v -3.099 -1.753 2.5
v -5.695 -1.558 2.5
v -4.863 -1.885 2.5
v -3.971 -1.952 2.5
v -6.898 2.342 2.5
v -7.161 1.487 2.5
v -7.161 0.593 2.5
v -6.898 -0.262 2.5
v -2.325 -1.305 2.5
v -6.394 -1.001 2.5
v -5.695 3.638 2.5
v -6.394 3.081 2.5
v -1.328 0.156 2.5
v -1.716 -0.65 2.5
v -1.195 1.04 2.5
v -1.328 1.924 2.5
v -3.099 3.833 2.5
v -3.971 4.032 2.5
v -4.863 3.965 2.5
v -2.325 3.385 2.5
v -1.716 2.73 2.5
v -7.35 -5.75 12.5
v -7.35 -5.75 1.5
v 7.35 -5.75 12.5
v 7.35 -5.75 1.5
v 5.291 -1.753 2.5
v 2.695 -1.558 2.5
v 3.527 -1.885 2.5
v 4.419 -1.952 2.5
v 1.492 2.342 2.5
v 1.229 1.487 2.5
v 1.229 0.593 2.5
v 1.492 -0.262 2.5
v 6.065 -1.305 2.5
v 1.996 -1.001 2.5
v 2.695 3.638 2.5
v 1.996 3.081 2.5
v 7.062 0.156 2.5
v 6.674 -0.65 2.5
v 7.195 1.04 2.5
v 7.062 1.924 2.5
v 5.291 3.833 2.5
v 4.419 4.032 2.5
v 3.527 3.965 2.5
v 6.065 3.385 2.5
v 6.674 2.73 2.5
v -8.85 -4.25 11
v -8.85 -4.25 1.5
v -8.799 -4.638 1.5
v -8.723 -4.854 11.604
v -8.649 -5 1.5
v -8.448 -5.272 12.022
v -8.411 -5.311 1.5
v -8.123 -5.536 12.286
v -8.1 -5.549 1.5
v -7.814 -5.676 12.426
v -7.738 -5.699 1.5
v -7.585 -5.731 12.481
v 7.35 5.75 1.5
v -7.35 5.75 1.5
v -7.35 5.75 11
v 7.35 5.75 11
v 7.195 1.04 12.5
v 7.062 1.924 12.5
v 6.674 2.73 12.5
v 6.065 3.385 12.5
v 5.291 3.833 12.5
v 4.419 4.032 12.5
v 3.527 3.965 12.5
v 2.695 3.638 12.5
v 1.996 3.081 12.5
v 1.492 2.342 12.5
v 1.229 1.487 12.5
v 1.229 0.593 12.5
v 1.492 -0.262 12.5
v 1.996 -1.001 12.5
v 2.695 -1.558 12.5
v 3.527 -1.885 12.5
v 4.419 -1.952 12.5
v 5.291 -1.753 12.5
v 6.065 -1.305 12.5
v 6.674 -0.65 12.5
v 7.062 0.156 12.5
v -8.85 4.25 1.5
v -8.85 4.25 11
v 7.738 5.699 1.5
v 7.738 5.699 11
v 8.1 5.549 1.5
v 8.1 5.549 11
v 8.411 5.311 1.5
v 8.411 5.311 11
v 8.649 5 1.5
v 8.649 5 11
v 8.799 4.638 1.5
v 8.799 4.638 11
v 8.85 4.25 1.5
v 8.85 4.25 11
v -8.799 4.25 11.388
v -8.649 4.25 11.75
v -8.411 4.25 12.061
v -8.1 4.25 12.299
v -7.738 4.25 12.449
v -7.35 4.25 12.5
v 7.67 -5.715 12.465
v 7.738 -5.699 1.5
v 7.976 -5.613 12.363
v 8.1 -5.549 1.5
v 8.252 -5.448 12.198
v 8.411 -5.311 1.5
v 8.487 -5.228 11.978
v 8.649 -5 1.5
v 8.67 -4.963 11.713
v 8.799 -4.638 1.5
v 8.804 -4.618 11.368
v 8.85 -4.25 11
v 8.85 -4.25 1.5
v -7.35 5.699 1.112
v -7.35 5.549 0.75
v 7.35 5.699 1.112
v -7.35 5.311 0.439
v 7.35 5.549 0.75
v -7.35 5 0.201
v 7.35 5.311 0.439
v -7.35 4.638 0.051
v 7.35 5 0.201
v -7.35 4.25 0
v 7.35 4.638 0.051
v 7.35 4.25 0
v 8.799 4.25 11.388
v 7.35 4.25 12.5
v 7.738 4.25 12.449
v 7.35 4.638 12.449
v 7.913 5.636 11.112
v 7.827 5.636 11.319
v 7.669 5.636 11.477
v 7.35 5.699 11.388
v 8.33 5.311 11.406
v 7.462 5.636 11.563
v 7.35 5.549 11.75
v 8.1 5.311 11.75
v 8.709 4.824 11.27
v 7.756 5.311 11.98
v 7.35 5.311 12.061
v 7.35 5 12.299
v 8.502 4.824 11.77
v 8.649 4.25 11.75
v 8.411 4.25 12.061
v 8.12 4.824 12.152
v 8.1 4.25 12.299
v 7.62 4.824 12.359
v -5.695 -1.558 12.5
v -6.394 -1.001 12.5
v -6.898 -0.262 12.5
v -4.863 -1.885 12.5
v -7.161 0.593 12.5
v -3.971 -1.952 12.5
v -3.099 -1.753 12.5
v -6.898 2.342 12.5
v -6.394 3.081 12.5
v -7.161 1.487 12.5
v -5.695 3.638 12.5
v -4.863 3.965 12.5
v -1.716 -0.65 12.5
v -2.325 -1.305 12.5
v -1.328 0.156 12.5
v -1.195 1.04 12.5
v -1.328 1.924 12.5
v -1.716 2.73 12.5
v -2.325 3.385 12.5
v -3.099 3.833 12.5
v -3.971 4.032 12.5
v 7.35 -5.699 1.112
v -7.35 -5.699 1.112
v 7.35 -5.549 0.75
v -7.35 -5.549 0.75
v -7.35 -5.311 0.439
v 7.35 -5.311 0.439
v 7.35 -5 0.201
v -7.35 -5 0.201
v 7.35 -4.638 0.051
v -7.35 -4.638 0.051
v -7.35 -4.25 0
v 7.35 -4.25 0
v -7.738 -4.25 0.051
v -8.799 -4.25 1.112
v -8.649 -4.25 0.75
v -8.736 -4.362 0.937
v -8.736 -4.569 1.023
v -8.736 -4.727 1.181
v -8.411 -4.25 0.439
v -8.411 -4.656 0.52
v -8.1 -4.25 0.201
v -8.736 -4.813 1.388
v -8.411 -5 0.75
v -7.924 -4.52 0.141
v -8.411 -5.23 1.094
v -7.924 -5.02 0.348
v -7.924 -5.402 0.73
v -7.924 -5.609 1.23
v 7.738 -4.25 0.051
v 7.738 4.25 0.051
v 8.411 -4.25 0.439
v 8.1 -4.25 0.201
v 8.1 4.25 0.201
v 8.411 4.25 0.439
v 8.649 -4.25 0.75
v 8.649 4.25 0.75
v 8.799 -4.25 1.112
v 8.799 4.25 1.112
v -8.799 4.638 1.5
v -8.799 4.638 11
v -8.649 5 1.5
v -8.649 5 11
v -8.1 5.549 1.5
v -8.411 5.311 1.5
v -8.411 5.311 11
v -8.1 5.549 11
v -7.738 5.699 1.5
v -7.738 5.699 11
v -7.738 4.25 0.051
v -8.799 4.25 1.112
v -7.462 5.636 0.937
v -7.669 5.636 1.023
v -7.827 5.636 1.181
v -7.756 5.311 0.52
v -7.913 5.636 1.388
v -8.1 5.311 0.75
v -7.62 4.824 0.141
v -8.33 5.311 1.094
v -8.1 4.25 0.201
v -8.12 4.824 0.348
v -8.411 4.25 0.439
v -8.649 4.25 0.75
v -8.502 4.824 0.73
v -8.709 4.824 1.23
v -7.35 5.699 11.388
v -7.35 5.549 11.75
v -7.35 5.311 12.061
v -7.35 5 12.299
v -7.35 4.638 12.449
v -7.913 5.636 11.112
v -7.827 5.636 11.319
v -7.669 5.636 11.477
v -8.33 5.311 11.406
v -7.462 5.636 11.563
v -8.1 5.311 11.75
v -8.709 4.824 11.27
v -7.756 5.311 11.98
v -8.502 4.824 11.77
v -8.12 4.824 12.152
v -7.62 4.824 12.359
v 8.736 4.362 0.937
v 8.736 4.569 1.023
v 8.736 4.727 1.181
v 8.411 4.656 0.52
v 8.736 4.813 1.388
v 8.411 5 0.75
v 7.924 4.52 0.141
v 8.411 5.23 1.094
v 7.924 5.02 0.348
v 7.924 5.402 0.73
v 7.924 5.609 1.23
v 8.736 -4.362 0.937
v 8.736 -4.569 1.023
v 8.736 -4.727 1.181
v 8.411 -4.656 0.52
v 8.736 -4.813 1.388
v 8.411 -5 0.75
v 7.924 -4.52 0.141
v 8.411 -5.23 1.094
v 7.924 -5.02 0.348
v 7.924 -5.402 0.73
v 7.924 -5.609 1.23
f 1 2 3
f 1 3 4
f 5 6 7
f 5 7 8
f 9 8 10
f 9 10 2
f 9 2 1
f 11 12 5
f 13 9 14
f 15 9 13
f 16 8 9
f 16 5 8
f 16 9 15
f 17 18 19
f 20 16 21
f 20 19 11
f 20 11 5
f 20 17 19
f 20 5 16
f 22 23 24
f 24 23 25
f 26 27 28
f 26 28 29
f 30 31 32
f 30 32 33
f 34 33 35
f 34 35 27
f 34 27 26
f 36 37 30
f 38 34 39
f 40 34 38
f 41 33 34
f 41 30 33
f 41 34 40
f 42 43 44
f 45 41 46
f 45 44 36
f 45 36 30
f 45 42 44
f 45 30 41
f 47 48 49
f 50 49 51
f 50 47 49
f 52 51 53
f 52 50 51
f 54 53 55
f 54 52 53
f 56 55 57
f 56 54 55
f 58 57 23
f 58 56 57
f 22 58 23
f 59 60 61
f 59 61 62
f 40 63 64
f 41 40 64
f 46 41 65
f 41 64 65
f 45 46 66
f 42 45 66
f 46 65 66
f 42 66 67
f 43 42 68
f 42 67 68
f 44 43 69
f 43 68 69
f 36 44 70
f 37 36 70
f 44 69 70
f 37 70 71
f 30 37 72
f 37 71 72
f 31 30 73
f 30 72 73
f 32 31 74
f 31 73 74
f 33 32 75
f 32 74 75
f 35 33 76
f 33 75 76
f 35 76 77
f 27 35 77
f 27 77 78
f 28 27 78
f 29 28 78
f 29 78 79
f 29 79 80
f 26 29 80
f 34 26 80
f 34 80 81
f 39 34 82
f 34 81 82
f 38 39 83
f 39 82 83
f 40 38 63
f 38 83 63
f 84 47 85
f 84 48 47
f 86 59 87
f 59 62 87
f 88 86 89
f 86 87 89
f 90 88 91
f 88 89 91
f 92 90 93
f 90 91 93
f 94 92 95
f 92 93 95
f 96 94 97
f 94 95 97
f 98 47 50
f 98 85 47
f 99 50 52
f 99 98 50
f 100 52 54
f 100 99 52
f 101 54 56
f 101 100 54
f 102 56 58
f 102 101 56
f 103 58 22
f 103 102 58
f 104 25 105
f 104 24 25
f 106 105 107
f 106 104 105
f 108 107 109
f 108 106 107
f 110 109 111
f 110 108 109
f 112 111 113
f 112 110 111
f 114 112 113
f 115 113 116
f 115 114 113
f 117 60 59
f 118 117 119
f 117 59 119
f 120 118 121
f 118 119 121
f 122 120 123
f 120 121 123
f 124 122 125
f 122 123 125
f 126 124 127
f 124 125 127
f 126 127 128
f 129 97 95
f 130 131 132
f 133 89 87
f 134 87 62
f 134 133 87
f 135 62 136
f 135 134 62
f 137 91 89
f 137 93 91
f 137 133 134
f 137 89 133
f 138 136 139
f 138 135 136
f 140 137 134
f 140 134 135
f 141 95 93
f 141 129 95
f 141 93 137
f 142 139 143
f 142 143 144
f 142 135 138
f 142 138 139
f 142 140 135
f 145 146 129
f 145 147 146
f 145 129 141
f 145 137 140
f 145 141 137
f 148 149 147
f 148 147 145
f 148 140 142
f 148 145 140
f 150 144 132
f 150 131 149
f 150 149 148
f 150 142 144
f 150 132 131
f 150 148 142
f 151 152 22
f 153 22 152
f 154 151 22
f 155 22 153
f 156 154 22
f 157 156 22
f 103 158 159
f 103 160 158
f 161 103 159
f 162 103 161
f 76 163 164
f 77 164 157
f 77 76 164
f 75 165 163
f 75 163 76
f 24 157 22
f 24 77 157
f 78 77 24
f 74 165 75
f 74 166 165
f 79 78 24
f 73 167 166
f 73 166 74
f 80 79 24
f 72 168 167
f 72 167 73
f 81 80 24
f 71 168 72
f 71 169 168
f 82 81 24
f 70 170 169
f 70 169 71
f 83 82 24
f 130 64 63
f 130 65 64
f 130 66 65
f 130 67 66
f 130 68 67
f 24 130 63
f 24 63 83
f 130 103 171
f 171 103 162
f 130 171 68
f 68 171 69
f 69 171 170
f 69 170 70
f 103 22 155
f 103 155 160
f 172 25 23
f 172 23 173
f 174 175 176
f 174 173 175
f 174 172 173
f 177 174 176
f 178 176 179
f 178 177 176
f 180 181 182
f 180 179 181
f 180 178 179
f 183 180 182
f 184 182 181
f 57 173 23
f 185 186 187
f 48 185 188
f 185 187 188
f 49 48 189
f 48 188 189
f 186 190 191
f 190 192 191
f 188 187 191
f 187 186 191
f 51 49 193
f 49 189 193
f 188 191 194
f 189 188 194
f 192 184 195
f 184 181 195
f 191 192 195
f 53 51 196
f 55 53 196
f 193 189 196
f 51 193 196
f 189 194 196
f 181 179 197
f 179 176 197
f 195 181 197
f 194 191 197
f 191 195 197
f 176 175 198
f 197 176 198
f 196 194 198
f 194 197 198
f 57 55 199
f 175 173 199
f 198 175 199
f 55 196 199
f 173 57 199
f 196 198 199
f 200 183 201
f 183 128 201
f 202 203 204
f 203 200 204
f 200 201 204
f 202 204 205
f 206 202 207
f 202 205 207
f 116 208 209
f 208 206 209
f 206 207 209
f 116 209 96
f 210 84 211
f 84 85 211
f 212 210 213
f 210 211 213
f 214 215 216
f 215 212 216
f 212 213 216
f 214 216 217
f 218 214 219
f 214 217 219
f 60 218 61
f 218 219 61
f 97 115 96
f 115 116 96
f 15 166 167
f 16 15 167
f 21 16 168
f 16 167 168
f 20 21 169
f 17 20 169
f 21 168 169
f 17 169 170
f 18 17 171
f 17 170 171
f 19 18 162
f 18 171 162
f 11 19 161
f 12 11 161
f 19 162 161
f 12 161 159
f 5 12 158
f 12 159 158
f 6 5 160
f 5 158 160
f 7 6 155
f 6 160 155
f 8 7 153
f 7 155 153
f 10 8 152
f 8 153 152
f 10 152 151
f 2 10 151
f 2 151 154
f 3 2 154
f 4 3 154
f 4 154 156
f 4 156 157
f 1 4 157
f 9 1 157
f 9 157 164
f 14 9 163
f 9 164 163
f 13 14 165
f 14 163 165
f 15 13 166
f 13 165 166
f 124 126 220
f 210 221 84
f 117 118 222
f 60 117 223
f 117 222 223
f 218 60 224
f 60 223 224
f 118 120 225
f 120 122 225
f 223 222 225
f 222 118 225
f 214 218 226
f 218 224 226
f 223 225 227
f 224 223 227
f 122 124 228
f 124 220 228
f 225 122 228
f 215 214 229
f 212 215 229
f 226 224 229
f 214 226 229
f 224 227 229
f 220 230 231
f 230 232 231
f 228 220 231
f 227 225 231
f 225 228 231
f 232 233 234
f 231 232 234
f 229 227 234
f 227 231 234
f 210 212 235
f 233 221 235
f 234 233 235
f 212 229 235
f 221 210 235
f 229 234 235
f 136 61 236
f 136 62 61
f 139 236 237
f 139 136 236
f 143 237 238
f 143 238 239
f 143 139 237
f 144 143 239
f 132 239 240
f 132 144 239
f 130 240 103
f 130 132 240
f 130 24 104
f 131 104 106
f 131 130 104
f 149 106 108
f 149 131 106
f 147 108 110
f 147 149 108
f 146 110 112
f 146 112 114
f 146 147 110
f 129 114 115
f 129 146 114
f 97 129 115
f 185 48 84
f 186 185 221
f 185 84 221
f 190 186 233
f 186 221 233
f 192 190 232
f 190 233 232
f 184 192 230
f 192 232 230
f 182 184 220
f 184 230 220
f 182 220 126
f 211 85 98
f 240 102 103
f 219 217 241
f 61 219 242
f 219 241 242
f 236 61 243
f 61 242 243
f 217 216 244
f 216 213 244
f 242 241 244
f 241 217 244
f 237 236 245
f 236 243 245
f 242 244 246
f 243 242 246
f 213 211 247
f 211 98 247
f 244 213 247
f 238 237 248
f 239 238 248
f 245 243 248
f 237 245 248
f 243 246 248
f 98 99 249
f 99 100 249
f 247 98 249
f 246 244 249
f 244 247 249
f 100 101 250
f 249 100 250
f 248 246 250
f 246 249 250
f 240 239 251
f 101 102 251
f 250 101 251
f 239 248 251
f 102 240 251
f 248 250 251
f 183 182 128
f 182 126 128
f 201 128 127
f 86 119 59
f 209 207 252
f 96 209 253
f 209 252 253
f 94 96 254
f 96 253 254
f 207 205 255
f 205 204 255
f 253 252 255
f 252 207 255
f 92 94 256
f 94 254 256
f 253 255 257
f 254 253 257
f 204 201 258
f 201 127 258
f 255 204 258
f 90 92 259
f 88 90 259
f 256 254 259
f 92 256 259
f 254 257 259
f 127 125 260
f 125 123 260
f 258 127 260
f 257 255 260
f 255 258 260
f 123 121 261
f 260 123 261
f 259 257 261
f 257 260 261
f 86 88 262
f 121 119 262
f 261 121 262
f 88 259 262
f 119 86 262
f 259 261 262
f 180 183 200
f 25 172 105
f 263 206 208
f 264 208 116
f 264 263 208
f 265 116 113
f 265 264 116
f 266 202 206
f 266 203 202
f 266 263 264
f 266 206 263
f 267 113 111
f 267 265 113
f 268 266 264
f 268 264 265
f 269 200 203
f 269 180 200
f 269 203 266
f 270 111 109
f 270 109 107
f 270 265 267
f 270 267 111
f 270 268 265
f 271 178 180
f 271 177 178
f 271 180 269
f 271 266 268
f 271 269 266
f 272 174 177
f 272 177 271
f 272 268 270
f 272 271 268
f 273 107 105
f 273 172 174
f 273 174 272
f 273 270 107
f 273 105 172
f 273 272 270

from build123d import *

# Parameters (mm, degrees)
ESBO_O1_W                = 17.7
ESBO_O1_H                = 11.5
RESSALTO_EXTRUS_O1_DEPTH = 12.5
ESBO_O2_R                = 3
CORTE_EXTRUS_O1_DEPTH    = 10
FILETE1_R                = 1.5


with BuildPart() as part:
    # Esboço1 → Ressalto-extrusão1 (new body)
    with BuildSketch(Plane.XY):
        Rectangle(ESBO_O1_W, ESBO_O1_H)
    extrude(amount=RESSALTO_EXTRUS_O1_DEPTH)

    # Esboço2 → Corte-extrusão1 (cut)
    with BuildSketch(Plane.XY.offset(12.5)):
        with Locations((4.195, 1.04)):
            Circle(ESBO_O2_R)
        with Locations((-4.195, 1.04)):
            Circle(ESBO_O2_R)
    extrude(amount=-CORTE_EXTRUS_O1_DEPTH, mode=Mode.SUBTRACT)

    # Filete1
    filete1_edges = [part.edges().sort_by_distance(p)[0] for p in [
        (-8.85, 0, 12.5),
        (8.85, 0, 12.5),
        (0, -5.75, 0),
        (-8.85, 0, 0),
        (0, 5.75, 0),
        (8.85, 0, 0),
        (8.85, -5.75, 6.25),
        (-8.85, -5.75, 6.25),
        (-8.85, 5.75, 6.25),
        (8.85, 5.75, 6.25),
        (0, 5.75, 12.5),
    ]]
    fillet(filete1_edges, radius=FILETE1_R)


solid = part.part
